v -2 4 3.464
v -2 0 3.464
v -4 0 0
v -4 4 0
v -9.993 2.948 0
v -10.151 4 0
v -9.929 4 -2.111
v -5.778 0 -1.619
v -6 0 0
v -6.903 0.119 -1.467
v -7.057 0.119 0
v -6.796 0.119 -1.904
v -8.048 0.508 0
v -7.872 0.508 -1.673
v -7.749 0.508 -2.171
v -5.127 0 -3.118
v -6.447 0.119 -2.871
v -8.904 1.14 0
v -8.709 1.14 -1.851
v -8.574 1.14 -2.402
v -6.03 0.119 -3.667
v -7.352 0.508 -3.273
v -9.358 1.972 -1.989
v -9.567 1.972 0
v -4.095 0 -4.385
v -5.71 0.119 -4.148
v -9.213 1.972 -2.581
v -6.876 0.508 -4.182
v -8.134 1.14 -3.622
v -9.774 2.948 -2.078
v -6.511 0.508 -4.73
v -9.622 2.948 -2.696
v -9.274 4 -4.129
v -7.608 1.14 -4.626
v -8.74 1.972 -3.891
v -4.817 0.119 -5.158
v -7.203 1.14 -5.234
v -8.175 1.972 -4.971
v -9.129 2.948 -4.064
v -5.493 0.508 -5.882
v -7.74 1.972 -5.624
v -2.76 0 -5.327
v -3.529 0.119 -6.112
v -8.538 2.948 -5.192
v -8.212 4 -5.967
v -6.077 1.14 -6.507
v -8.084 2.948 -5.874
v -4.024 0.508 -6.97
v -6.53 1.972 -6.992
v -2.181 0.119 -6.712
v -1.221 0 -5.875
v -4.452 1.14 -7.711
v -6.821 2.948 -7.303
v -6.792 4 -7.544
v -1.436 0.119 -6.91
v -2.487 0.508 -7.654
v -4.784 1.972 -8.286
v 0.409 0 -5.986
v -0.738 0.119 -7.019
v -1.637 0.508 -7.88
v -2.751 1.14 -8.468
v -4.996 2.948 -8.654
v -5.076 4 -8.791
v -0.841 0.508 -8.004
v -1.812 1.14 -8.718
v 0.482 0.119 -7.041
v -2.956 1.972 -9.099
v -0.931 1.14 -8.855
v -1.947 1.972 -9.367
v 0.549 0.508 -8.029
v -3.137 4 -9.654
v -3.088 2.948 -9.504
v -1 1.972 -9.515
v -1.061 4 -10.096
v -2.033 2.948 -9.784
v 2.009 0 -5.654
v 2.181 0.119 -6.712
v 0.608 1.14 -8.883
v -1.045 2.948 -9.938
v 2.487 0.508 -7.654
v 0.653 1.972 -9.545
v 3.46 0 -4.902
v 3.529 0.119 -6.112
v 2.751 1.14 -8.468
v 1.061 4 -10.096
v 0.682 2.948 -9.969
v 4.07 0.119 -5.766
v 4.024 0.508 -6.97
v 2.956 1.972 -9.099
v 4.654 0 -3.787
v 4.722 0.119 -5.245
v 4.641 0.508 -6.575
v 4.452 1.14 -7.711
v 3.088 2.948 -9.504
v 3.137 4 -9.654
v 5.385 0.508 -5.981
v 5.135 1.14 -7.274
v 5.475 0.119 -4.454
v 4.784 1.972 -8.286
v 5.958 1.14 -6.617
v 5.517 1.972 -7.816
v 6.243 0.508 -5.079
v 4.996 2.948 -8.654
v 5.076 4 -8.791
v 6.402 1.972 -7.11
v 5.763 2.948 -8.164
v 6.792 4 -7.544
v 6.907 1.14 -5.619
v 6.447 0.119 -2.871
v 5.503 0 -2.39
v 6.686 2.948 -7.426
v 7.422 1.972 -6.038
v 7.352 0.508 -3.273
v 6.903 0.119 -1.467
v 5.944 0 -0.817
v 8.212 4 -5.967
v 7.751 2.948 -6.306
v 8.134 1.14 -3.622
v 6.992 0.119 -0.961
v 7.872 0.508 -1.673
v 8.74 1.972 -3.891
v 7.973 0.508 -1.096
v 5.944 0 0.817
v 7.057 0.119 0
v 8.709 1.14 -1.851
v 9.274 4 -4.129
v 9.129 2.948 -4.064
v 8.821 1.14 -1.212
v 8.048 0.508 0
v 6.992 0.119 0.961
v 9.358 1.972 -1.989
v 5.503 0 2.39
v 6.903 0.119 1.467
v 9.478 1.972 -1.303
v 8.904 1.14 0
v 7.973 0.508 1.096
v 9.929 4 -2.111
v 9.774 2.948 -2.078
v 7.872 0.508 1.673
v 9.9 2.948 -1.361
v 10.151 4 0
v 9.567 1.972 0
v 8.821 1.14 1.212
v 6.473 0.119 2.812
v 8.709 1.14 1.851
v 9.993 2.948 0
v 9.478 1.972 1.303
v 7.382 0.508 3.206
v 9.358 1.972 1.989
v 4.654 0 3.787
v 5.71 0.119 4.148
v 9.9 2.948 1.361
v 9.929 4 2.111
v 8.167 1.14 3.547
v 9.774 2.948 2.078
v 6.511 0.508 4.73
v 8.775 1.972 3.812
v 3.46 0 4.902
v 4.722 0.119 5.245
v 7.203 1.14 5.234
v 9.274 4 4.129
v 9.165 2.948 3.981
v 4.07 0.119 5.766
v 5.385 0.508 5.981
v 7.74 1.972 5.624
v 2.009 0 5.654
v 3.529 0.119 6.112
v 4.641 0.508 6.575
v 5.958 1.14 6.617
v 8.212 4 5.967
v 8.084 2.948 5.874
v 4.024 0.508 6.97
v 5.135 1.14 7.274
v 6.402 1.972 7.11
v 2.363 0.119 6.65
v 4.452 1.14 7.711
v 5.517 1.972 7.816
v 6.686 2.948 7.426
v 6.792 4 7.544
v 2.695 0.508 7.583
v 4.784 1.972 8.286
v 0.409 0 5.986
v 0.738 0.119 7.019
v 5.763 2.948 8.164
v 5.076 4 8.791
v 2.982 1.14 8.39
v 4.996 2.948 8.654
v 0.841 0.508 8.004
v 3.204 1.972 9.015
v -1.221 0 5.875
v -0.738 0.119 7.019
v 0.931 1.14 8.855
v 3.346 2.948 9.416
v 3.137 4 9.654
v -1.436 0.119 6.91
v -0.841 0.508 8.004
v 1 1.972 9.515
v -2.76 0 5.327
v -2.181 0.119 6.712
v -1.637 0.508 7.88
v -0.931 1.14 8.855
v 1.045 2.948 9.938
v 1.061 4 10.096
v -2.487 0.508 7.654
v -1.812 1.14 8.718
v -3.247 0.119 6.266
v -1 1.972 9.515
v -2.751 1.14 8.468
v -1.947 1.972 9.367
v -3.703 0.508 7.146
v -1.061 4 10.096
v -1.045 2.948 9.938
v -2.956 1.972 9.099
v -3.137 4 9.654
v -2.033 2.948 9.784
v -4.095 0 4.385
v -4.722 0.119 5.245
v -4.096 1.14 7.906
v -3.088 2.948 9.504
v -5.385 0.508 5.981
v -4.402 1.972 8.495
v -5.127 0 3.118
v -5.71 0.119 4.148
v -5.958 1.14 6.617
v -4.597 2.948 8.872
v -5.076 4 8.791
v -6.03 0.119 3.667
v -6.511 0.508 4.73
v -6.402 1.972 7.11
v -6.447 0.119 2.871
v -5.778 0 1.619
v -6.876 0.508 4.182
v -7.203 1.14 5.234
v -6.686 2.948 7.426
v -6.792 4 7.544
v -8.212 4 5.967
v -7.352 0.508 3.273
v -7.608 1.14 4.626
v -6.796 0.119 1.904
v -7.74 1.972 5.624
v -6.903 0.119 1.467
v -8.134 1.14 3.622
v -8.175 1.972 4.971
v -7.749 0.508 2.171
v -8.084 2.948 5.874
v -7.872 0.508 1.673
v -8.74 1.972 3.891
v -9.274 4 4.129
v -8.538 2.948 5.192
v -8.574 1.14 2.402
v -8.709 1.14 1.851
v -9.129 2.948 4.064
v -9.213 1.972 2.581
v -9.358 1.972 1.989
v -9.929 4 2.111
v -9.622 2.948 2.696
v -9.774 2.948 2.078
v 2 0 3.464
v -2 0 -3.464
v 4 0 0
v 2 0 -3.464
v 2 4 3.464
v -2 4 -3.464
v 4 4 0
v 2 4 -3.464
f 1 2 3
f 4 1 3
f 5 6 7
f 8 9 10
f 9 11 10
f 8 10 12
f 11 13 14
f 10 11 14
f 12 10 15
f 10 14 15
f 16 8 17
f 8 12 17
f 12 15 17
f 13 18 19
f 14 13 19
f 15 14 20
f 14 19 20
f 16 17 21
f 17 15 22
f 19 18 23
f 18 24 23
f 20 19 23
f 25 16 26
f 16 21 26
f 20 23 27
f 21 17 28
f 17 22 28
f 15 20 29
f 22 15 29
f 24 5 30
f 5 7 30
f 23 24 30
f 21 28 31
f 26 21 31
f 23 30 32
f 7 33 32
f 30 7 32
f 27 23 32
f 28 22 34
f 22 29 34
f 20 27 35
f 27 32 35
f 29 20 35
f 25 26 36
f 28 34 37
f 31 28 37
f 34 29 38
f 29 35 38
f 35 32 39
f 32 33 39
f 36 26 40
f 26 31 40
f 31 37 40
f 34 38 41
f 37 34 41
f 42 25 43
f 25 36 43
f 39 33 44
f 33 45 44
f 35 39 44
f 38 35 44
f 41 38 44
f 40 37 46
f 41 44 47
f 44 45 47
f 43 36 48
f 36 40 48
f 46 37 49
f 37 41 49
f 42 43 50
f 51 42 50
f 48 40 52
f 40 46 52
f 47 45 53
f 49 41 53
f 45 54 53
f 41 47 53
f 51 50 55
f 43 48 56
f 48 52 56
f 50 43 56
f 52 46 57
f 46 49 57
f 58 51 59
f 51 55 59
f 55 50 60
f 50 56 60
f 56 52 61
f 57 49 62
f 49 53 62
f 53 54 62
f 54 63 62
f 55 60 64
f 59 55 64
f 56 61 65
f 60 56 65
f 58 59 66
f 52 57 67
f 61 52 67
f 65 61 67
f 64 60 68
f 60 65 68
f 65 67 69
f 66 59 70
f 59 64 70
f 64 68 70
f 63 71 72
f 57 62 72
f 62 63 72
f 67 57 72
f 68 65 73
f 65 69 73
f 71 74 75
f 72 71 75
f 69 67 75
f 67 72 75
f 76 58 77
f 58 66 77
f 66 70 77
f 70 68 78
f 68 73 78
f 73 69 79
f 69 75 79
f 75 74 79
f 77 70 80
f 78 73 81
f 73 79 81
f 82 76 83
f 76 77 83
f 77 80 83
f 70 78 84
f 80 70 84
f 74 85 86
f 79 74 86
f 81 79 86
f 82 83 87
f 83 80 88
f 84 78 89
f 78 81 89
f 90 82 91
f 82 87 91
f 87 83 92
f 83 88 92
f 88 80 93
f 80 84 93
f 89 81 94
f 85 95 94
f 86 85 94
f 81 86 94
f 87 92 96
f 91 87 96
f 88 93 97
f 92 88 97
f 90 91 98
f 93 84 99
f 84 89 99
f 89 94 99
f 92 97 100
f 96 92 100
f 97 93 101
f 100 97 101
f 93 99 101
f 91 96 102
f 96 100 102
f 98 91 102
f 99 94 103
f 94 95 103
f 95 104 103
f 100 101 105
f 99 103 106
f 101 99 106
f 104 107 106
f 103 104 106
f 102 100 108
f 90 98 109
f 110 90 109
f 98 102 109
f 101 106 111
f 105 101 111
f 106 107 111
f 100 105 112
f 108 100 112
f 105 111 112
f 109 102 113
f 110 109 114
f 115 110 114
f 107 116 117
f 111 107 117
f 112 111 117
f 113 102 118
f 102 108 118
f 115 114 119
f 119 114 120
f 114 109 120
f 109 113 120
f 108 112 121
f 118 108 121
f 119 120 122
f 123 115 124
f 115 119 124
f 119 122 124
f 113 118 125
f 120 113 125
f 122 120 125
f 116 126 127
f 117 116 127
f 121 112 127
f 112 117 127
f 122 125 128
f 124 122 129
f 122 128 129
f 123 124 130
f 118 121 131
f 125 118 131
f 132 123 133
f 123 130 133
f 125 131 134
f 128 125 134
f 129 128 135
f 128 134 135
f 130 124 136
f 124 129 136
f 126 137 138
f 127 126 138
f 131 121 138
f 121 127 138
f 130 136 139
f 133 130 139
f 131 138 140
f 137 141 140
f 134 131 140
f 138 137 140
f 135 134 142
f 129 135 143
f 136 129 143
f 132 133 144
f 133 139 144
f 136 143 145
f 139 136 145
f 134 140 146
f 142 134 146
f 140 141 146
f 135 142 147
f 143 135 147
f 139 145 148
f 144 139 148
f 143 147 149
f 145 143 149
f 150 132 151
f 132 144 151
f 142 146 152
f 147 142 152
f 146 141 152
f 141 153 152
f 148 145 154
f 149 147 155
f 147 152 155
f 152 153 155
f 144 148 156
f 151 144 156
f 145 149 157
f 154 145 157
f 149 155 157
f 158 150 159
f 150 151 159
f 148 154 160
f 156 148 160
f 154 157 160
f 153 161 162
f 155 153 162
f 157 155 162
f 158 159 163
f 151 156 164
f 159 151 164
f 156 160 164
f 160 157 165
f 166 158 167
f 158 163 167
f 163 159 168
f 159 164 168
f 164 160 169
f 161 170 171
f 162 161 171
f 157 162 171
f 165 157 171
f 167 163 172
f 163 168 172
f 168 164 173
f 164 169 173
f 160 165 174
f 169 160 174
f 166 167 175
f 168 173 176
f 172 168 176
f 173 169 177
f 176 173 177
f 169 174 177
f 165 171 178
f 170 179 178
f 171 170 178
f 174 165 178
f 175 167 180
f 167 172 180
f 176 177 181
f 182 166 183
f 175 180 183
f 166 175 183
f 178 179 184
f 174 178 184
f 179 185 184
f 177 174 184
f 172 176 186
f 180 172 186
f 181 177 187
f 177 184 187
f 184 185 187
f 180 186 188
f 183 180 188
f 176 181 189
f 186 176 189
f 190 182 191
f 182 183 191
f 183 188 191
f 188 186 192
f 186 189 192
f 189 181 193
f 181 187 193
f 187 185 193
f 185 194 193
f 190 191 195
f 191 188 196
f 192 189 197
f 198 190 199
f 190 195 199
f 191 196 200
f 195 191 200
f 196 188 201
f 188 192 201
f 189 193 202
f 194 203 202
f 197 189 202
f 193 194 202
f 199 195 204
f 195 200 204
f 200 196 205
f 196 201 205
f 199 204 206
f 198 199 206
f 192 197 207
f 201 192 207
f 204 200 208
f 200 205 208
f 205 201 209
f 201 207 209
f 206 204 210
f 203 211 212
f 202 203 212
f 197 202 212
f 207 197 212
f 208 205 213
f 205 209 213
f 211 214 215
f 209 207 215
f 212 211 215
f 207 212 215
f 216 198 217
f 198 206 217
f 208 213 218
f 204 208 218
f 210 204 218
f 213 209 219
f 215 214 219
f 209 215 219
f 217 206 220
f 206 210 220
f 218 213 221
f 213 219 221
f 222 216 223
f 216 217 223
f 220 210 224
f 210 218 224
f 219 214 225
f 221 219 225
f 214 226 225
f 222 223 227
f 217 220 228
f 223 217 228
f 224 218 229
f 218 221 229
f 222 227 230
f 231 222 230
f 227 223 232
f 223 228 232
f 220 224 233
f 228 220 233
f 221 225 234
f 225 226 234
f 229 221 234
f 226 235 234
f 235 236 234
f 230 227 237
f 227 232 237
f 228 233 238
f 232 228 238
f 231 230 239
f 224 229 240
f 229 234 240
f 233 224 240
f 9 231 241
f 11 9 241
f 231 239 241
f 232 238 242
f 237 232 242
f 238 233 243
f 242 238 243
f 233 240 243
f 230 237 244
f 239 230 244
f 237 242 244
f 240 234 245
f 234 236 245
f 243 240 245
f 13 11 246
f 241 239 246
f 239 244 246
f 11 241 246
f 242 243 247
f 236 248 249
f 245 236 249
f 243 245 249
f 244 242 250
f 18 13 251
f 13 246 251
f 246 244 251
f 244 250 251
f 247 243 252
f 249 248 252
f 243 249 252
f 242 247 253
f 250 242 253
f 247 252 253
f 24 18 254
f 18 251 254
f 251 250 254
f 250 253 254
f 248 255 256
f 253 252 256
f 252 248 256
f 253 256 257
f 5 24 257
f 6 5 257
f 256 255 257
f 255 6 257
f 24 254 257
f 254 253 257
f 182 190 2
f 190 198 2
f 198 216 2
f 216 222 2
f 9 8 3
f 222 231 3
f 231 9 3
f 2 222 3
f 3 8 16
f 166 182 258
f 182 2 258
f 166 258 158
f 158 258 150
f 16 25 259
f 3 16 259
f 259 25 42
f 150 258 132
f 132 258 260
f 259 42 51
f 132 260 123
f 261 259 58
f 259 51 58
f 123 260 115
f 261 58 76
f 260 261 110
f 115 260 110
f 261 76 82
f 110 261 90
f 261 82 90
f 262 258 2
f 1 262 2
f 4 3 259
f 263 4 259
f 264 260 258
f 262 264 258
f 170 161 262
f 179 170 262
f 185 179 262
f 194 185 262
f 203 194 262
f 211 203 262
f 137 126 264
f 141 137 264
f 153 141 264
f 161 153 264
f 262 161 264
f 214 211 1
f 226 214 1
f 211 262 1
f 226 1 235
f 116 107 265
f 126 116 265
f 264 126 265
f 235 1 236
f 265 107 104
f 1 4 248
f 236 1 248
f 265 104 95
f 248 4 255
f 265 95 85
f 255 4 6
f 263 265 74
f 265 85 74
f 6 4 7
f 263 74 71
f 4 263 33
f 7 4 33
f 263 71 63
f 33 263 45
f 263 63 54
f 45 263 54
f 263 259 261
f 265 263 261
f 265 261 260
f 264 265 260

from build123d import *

# Parameters (mm, degrees)
CUT_EXTRUDE1_DEPTH = 4.8


with BuildPart() as part:
    # Sketch1 → Revolve1 (revolve)
    with BuildSketch(Plane.XY, mode=Mode.PRIVATE) as revolve1_sk:
        with BuildLine():
            Line((0, 0), (6, 0))
            ThreePointArc((6, 0), (8.904011689, 1.140264724), (10.151169128, 4))
            Line((10.151169128, 4), (0, 4))
            Line((0, 4), (0, 0))
        make_face()
    revolve(revolve1_sk.sketch.rotate(Axis((0, 4, 0), (0, -1, 0)), 180), axis=Axis((0, 4, 0), (0, -1, 0)))

    # Sketch2 → Cut-Extrude1 (cut)
    with BuildSketch(Plane.XZ):
        Polygon((4, 0), (2, 3.464101615), (-2, 3.464101615), (-4, 0), (-2, -3.464101615), (2, -3.464101615), align=None)
    extrude(amount=-CUT_EXTRUDE1_DEPTH, mode=Mode.SUBTRACT)


solid = part.part
